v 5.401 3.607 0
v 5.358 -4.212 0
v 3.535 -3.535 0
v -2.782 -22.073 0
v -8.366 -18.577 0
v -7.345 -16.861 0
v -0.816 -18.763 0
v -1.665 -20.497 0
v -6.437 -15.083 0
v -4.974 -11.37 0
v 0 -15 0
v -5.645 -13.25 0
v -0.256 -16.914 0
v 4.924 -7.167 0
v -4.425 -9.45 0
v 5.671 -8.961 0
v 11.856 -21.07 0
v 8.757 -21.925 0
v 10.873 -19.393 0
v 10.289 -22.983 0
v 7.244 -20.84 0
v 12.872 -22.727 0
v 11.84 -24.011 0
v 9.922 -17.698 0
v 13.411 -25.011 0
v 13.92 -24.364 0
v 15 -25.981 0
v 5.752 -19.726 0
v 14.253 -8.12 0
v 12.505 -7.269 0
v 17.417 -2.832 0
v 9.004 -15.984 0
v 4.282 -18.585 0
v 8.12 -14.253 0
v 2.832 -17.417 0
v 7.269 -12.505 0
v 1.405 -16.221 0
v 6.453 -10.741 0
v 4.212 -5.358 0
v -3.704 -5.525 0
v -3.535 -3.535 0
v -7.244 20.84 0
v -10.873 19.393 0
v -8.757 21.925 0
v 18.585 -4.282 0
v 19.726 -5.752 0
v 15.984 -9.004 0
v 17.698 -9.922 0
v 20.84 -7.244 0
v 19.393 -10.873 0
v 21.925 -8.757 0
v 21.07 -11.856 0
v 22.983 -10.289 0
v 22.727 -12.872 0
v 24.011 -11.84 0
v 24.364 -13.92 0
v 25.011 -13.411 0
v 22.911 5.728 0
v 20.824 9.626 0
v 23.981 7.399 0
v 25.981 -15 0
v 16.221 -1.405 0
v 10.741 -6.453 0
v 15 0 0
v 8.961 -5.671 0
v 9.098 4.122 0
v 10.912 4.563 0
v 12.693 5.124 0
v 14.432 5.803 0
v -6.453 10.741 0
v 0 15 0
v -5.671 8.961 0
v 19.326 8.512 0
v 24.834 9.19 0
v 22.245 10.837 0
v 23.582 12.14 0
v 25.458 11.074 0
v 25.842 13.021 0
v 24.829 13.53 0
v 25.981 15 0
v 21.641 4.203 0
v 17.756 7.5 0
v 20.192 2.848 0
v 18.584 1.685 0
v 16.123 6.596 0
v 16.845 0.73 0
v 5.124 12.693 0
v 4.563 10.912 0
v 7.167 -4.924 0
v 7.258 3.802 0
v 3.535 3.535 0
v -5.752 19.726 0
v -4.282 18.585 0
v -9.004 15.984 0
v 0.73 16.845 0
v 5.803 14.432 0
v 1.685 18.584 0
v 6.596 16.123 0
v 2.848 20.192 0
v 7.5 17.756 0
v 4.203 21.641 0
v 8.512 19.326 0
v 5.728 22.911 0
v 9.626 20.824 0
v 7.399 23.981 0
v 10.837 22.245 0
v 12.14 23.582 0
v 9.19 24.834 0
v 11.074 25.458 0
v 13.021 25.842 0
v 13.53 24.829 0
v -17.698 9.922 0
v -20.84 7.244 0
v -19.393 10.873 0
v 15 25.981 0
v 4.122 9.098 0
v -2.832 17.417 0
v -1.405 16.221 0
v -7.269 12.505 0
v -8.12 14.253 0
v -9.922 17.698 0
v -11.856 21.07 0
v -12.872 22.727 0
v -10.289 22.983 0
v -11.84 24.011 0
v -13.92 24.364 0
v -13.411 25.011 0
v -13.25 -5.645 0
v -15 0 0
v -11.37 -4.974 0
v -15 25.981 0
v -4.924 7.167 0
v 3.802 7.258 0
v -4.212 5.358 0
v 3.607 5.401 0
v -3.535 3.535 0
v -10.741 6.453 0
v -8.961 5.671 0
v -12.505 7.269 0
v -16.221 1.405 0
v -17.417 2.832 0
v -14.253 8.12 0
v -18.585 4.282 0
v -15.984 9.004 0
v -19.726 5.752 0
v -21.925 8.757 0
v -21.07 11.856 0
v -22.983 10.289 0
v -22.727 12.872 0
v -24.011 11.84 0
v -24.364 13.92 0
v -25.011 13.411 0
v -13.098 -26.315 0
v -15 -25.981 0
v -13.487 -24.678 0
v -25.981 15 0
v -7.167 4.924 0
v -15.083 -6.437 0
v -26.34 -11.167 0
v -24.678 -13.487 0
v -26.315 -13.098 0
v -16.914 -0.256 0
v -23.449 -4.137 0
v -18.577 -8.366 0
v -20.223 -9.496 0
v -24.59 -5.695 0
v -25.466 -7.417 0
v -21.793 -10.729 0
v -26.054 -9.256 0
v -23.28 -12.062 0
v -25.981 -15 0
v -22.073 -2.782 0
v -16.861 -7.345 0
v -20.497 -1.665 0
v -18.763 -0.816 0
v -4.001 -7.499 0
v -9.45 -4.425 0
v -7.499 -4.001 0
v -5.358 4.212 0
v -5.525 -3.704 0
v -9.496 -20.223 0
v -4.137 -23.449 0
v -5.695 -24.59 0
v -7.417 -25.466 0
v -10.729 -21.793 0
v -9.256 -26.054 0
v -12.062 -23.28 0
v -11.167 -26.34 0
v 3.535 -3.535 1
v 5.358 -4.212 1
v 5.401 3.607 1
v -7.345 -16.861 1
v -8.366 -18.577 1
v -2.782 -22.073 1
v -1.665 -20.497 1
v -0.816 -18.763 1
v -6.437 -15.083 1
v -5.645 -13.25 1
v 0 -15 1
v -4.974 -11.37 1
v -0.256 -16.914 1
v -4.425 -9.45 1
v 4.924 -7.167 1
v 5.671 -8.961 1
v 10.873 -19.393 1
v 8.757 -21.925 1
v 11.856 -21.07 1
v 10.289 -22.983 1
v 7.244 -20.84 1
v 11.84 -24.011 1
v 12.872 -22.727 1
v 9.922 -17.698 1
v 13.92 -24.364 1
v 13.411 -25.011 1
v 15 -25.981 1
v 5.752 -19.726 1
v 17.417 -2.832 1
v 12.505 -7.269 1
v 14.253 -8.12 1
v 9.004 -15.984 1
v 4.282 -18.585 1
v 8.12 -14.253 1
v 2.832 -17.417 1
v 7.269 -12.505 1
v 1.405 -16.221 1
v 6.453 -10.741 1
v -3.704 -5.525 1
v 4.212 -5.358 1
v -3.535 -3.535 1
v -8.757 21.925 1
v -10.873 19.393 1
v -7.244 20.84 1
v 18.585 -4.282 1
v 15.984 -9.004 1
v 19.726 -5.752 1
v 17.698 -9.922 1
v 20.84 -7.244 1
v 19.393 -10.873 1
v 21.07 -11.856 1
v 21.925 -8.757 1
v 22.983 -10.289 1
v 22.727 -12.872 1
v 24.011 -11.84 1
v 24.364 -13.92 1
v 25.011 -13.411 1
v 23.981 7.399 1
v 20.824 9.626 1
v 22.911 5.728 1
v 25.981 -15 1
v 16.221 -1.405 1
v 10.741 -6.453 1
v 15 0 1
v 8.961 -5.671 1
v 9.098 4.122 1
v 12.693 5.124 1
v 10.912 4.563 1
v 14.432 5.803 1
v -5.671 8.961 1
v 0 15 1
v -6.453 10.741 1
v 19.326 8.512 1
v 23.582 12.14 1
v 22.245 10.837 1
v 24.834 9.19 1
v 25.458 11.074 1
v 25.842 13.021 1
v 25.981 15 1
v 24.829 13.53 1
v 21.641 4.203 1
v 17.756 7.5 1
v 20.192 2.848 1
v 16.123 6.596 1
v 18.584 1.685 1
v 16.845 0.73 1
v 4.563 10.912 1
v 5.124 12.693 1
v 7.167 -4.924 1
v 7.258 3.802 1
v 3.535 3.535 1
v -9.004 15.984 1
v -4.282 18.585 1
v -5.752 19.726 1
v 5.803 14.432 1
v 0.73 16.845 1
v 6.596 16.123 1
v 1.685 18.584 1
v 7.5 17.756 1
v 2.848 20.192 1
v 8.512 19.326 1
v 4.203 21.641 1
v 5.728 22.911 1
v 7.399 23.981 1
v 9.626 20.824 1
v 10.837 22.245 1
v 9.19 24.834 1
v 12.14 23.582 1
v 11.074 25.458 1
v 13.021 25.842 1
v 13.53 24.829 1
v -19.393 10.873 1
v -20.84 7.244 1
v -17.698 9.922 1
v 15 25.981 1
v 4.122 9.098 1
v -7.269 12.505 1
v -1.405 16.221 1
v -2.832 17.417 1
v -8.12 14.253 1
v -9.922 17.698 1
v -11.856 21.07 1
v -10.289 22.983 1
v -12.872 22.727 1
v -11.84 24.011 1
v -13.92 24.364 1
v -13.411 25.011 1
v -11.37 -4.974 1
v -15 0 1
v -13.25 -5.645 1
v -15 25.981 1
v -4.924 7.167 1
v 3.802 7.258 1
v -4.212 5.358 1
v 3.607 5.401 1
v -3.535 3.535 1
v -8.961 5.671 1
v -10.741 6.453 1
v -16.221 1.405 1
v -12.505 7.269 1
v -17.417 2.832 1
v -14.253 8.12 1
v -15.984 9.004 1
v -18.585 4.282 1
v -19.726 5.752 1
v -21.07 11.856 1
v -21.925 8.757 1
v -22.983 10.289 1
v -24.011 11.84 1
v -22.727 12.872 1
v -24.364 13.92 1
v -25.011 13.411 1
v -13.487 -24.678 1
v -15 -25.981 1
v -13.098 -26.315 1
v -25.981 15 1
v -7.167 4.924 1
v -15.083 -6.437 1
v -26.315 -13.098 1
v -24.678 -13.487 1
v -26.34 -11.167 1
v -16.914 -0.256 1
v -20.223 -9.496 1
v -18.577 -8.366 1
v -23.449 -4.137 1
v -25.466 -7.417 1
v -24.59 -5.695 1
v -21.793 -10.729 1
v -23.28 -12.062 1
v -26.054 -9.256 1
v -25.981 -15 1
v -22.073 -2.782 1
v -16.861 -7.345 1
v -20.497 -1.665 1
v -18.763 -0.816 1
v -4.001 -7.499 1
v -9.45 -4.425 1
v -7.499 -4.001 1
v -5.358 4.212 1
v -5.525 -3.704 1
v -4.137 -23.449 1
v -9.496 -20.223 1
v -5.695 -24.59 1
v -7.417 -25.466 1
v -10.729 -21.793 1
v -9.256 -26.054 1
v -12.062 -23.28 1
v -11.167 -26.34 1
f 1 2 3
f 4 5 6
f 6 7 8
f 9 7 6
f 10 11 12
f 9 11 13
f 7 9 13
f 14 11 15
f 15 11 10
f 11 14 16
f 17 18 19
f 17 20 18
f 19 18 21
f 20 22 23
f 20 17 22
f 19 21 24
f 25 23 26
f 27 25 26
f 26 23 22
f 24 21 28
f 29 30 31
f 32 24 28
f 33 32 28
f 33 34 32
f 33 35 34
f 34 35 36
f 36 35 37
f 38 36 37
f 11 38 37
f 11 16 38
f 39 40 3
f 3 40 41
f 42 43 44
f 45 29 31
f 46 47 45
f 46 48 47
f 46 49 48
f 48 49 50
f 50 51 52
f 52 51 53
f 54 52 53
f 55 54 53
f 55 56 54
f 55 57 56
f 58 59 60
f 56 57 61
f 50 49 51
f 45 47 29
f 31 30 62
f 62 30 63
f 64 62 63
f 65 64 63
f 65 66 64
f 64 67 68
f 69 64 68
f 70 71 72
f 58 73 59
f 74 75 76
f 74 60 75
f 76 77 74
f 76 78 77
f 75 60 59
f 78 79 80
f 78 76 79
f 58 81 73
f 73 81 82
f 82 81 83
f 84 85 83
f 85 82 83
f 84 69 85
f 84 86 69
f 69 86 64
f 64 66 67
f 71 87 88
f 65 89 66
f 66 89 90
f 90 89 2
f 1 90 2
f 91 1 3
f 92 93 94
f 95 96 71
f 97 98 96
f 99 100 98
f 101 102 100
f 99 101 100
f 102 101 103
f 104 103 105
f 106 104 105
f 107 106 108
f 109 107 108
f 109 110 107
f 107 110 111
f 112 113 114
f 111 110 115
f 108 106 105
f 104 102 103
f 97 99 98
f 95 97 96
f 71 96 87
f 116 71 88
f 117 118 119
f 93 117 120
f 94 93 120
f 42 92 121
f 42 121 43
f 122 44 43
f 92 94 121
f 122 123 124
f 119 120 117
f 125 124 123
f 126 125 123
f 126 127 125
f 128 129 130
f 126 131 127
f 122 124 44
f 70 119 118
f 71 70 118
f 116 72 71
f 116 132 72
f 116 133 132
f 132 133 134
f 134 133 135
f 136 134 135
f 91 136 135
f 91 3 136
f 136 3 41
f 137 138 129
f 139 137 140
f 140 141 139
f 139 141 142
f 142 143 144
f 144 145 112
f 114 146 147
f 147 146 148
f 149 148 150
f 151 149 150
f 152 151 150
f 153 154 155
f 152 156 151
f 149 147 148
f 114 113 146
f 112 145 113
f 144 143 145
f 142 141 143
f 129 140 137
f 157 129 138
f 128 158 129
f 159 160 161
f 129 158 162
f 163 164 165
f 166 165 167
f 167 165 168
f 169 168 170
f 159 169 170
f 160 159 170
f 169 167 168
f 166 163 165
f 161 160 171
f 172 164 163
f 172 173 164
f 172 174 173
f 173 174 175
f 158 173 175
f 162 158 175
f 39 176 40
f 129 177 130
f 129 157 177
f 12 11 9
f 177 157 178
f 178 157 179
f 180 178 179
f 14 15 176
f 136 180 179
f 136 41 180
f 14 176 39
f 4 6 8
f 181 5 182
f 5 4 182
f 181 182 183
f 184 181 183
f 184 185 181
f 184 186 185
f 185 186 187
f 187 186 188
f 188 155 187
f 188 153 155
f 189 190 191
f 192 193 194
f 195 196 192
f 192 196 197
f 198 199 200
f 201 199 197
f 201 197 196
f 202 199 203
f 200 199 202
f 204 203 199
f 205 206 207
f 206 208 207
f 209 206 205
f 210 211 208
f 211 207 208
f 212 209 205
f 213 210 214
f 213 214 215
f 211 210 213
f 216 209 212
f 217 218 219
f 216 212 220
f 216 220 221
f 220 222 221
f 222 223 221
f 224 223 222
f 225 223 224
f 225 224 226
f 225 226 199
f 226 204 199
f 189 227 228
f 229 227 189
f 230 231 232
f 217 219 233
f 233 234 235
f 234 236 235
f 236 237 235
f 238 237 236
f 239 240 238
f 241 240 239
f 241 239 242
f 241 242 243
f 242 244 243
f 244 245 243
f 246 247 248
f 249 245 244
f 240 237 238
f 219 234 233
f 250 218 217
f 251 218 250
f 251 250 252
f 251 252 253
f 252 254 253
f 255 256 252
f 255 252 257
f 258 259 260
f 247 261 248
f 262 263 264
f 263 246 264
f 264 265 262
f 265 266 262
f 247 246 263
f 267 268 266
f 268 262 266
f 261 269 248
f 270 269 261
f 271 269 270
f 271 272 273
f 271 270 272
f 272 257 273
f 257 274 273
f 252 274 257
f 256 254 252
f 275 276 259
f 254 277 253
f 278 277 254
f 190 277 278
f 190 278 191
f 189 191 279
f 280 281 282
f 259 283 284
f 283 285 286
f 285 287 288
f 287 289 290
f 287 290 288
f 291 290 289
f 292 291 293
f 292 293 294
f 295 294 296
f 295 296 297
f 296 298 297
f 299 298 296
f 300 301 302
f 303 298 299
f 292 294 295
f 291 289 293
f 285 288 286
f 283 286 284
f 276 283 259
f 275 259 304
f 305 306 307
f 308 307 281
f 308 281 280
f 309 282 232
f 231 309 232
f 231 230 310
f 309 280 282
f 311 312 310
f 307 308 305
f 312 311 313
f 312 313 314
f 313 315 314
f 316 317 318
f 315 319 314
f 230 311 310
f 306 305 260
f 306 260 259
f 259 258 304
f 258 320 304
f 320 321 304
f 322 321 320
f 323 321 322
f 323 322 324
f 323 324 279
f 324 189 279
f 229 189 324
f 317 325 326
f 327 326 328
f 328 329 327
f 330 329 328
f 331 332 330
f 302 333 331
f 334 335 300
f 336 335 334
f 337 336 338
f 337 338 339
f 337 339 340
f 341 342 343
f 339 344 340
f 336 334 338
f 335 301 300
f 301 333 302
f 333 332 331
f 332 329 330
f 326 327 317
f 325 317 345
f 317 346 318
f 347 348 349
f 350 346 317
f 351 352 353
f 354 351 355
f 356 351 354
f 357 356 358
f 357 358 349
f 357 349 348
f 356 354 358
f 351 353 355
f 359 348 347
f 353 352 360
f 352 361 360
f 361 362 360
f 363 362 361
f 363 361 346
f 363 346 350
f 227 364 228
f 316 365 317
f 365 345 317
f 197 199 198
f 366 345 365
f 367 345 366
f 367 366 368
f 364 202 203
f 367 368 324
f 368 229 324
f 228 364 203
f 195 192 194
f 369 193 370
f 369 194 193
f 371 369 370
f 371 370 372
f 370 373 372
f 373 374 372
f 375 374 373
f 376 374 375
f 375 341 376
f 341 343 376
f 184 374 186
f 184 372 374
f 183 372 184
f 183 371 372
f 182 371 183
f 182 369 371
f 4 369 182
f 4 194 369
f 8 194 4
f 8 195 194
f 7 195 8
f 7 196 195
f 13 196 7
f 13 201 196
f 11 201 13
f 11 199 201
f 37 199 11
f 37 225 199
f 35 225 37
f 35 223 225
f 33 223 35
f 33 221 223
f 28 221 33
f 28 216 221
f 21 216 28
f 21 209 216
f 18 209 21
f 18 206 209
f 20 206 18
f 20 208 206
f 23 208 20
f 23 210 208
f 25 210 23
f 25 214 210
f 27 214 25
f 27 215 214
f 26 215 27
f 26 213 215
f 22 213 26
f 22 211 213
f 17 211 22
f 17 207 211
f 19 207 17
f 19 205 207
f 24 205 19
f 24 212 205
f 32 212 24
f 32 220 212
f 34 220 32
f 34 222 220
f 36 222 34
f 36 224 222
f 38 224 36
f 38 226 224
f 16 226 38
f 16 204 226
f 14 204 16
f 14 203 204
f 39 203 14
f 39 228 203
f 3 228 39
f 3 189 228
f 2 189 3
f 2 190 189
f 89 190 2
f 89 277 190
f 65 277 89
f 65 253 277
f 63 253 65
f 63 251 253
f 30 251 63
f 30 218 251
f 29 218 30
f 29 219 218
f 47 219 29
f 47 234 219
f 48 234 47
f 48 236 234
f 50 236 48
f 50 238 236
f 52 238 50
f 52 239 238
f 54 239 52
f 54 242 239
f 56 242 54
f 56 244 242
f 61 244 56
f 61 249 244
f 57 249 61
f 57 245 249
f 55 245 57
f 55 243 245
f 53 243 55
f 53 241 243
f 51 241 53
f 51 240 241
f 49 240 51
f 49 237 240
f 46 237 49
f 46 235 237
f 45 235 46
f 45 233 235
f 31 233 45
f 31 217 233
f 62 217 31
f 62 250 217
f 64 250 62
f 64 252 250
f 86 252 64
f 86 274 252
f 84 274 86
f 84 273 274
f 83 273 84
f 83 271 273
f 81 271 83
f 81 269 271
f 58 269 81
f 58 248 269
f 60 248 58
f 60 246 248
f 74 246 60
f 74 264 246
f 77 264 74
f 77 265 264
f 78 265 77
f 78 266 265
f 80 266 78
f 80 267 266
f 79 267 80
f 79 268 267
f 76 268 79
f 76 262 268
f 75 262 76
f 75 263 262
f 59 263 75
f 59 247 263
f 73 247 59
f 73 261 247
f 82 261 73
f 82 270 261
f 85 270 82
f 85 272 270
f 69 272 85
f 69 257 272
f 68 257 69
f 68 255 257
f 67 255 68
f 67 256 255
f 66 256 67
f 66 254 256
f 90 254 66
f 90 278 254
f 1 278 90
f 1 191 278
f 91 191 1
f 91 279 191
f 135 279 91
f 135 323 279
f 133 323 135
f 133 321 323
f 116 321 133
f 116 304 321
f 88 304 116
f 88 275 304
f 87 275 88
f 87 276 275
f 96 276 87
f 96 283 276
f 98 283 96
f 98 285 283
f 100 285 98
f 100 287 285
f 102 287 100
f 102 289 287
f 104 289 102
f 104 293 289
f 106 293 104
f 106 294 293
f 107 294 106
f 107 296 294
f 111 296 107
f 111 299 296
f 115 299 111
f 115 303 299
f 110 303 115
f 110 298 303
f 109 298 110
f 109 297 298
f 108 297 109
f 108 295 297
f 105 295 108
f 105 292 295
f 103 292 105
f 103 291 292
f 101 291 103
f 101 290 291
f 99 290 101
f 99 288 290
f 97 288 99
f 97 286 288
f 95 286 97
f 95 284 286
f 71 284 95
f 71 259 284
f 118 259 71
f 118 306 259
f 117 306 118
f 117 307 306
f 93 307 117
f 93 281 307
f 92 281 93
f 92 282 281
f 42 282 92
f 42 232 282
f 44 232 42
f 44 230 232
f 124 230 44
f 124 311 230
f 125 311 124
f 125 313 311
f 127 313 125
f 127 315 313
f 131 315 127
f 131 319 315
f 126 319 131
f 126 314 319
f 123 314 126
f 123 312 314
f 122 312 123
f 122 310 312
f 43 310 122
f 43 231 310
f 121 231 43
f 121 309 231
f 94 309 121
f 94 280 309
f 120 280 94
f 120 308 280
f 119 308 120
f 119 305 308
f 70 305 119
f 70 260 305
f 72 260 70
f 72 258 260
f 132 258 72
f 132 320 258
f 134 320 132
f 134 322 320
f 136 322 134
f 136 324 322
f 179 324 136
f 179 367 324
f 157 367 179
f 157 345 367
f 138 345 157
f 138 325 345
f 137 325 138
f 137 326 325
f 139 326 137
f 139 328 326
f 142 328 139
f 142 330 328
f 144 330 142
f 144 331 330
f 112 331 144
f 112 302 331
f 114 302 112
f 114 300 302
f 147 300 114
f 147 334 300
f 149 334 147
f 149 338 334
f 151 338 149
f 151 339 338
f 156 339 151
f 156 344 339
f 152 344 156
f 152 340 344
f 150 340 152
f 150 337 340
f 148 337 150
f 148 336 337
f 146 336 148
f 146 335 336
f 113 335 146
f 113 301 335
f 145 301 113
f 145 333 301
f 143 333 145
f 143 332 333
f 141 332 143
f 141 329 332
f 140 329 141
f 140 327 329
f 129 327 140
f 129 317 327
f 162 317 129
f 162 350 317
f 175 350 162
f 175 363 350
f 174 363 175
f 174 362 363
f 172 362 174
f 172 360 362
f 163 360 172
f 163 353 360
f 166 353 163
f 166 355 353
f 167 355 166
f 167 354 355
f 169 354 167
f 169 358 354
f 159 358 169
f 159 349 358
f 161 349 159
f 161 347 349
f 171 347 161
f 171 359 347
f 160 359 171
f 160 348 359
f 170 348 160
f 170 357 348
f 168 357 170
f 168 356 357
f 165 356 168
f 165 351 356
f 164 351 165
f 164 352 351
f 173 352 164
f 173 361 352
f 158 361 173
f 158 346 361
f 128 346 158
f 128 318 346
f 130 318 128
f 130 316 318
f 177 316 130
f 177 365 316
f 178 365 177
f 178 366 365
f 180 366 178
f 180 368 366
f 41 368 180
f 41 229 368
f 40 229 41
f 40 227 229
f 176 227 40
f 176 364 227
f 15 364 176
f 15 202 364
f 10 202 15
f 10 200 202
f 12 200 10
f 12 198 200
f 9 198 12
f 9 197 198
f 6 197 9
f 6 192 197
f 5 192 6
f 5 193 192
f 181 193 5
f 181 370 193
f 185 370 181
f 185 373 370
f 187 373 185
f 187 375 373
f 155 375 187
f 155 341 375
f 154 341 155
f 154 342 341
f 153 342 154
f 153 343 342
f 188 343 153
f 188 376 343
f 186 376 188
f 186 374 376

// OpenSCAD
// Generated by Parametrix
ca_myPartM_face1_000 = [ [ 15.0000, 0.0000 ],[ 16.8449, 0.7303 ],[ 18.5845, 1.6847 ],[ 20.1917, 2.8484 ],[ 21.6414, 4.2031 ],[ 22.9111, 5.7279 ],[ 23.9809, 7.3990 ],[ 24.8343, 9.1903 ],[ 25.4579, 11.0740 ],[ 25.8421, 13.0206 ],[ 25.9808, 15.0000 ],[ 24.8293, 13.5301 ],[ 23.5823, 12.1404 ],[ 22.2454, 10.8370 ],[ 20.8245, 9.6256 ],[ 19.3259, 8.5118 ],[ 17.7563, 7.5005 ],[ 16.1228, 6.5961 ],[ 14.4325, 5.8027 ],[ 12.6931, 5.1240 ],[ 10.9123, 4.5627 ],[ 9.0980, 4.1216 ],[ 7.2582, 3.8025 ],[ 5.4013, 3.6068 ],[ 3.5355, 3.5355 ],[ 3.6068, 5.4013 ],[ 3.8025, 7.2582 ],[ 4.1216, 9.0980 ],[ 4.5627, 10.9123 ],[ 5.1240, 12.6931 ],[ 5.8027, 14.4325 ],[ 6.5961, 16.1228 ],[ 7.5005, 17.7563 ],[ 8.5118, 19.3259 ],[ 9.6256, 20.8245 ],[ 10.8370, 22.2454 ],[ 12.1404, 23.5823 ],[ 13.5301, 24.8293 ],[ 15.0000, 25.9808 ],[ 13.0206, 25.8421 ],[ 11.0740, 25.4579 ],[ 9.1903, 24.8343 ],[ 7.3990, 23.9809 ],[ 5.7279, 22.9111 ],[ 4.2031, 21.6414 ],[ 2.8484, 20.1917 ],[ 1.6847, 18.5845 ],[ 0.7303, 16.8449 ],[ -0.0000, 15.0000 ],[ -1.4049, 16.2215 ],[ -2.8322, 17.4166 ],[ -4.2816, 18.5850 ],[ -5.7524, 19.7261 ],[ -7.2443, 20.8397 ],[ -8.7566, 21.9253 ],[ -10.2889, 22.9826 ],[ -11.8405, 24.0112 ],[ -13.4111, 25.0107 ],[ -15.0000, 25.9808 ],[ -13.9203, 24.3643 ],[ -12.8723, 22.7271 ],[ -11.8563, 21.0699 ],[ -10.8727, 19.3933 ],[ -9.9218, 17.6978 ],[ -9.0041, 15.9842 ],[ -8.1199, 14.2531 ],[ -7.2695, 12.5051 ],[ -6.4532, 10.7409 ],[ -5.6714, 8.9612 ],[ -4.9243, 7.1666 ],[ -4.2123, 5.3578 ],[ -3.5355, 3.5355 ],[ -5.3578, 4.2123 ],[ -7.1666, 4.9243 ],[ -8.9612, 5.6714 ],[ -10.7409, 6.4532 ],[ -12.5051, 7.2695 ],[ -14.2531, 8.1199 ],[ -15.9842, 9.0041 ],[ -17.6978, 9.9218 ],[ -19.3933, 10.8727 ],[ -21.0699, 11.8563 ],[ -22.7271, 12.8723 ],[ -24.3643, 13.9203 ],[ -25.9808, 15.0000 ],[ -25.0107, 13.4111 ],[ -24.0112, 11.8405 ],[ -22.9826, 10.2889 ],[ -21.9253, 8.7566 ],[ -20.8397, 7.2443 ],[ -19.7261, 5.7524 ],[ -18.5850, 4.2816 ],[ -17.4166, 2.8322 ],[ -16.2215, 1.4049 ],[ -15.0000, 0.0000 ],[ -16.9143, -0.2560 ],[ -18.7627, -0.8160 ],[ -20.4974, -1.6653 ],[ -22.0732, -2.7820 ],[ -23.4493, -4.1371 ],[ -24.5902, -5.6955 ],[ -25.4661, -7.4168 ],[ -26.0545, -9.2564 ],[ -26.3399, -11.1666 ],[ -26.3152, -13.0978 ],[ -25.9808, -15.0000 ],[ -24.6778, -13.4872 ],[ -23.2800, -12.0616 ],[ -21.7930, -10.7293 ],[ -20.2232, -9.4957 ],[ -18.5769, -8.3660 ],[ -16.8612, -7.3450 ],[ -15.0832, -6.4368 ],[ -13.2502, -5.6453 ],[ -11.3700, -4.9737 ],[ -9.4504, -4.4250 ],[ -7.4993, -4.0012 ],[ -5.5249, -3.7044 ],[ -3.5355, -3.5355 ],[ -3.7044, -5.5249 ],[ -4.0012, -7.4993 ],[ -4.4250, -9.4504 ],[ -4.9737, -11.3700 ],[ -5.6453, -13.2502 ],[ -6.4368, -15.0832 ],[ -7.3450, -16.8612 ],[ -8.3660, -18.5769 ],[ -9.4957, -20.2232 ],[ -10.7293, -21.7930 ],[ -12.0616, -23.2800 ],[ -13.4872, -24.6778 ],[ -15.0000, -25.9808 ],[ -13.0978, -26.3152 ],[ -11.1666, -26.3399 ],[ -9.2564, -26.0545 ],[ -7.4168, -25.4661 ],[ -5.6955, -24.5902 ],[ -4.1371, -23.4493 ],[ -2.7820, -22.0732 ],[ -1.6653, -20.4974 ],[ -0.8160, -18.7627 ],[ -0.2560, -16.9143 ],[ -0.0000, -15.0000 ],[ 1.4049, -16.2215 ],[ 2.8322, -17.4166 ],[ 4.2816, -18.5850 ],[ 5.7524, -19.7261 ],[ 7.2443, -20.8397 ],[ 8.7566, -21.9253 ],[ 10.2889, -22.9826 ],[ 11.8405, -24.0112 ],[ 13.4111, -25.0107 ],[ 15.0000, -25.9808 ],[ 13.9203, -24.3643 ],[ 12.8723, -22.7271 ],[ 11.8563, -21.0699 ],[ 10.8727, -19.3933 ],[ 9.9218, -17.6978 ],[ 9.0041, -15.9842 ],[ 8.1199, -14.2531 ],[ 7.2695, -12.5051 ],[ 6.4532, -10.7409 ],[ 5.6714, -8.9612 ],[ 4.9243, -7.1666 ],[ 4.2123, -5.3578 ],[ 3.5355, -3.5355 ],[ 5.3578, -4.2123 ],[ 7.1666, -4.9243 ],[ 8.9612, -5.6714 ],[ 10.7409, -6.4532 ],[ 12.5051, -7.2695 ],[ 14.2531, -8.1199 ],[ 15.9842, -9.0041 ],[ 17.6978, -9.9218 ],[ 19.3933, -10.8727 ],[ 21.0699, -11.8563 ],[ 22.7271, -12.8723 ],[ 24.3643, -13.9203 ],[ 25.9808, -15.0000 ],[ 25.0107, -13.4111 ],[ 24.0112, -11.8405 ],[ 22.9826, -10.2889 ],[ 21.9253, -8.7566 ],[ 20.8397, -7.2443 ],[ 19.7261, -5.7524 ],[ 18.5850, -4.2816 ],[ 17.4166, -2.8322 ],[ 16.2215, -1.4049 ],[ 15.0000, 0.0000 ] ];
cb_myPartM_face1_000 = [  0, 1, 2, 3, 4, 5, 6, 7, 8, 9, 10, 11, 12, 13, 14, 15, 16, 17, 18, 19, 20, 21, 22, 23, 24, 25, 26, 27, 28, 29, 30, 31, 32, 33, 34, 35, 36, 37, 38, 39, 40, 41, 42, 43, 44, 45, 46, 47, 48, 49, 50, 51, 52, 53, 54, 55, 56, 57, 58, 59, 60, 61, 62, 63, 64, 65, 66, 67, 68, 69, 70, 71, 72, 73, 74, 75, 76, 77, 78, 79, 80, 81, 82, 83, 84, 85, 86, 87, 88, 89, 90, 91, 92, 93, 94, 95, 96, 97, 98, 99, 100, 101, 102, 103, 104, 105, 106, 107, 108, 109, 110, 111, 112, 113, 114, 115, 116, 117, 118, 119, 120, 121, 122, 123, 124, 125, 126, 127, 128, 129, 130, 131, 132, 133, 134, 135, 136, 137, 138, 139, 140, 141, 142, 143, 144, 145, 146, 147, 148, 149, 150, 151, 152, 153, 154, 155, 156, 157, 158, 159, 160, 161, 162, 163, 164, 165, 166, 167, 168, 169, 170, 171, 172, 173, 174, 175, 176, 177, 178, 179, 180, 181, 182, 183, 184, 185, 186, 187, 188 ];
a_myPartM_face1 = concat(ca_myPartM_face1_000);
b_myPartM_face1 = [cb_myPartM_face1_000];

module subpax_myPartM () {
	translate( [ 0, 0, 0 ])
		rotate( [ 0, 0, 0 ])
			   linear_extrude(height = 1) polygon(a_myPartM_face1, b_myPartM_face1);
}

module pax_myPartM () {
	subpax_myPartM();
}

pax_myPartM();
